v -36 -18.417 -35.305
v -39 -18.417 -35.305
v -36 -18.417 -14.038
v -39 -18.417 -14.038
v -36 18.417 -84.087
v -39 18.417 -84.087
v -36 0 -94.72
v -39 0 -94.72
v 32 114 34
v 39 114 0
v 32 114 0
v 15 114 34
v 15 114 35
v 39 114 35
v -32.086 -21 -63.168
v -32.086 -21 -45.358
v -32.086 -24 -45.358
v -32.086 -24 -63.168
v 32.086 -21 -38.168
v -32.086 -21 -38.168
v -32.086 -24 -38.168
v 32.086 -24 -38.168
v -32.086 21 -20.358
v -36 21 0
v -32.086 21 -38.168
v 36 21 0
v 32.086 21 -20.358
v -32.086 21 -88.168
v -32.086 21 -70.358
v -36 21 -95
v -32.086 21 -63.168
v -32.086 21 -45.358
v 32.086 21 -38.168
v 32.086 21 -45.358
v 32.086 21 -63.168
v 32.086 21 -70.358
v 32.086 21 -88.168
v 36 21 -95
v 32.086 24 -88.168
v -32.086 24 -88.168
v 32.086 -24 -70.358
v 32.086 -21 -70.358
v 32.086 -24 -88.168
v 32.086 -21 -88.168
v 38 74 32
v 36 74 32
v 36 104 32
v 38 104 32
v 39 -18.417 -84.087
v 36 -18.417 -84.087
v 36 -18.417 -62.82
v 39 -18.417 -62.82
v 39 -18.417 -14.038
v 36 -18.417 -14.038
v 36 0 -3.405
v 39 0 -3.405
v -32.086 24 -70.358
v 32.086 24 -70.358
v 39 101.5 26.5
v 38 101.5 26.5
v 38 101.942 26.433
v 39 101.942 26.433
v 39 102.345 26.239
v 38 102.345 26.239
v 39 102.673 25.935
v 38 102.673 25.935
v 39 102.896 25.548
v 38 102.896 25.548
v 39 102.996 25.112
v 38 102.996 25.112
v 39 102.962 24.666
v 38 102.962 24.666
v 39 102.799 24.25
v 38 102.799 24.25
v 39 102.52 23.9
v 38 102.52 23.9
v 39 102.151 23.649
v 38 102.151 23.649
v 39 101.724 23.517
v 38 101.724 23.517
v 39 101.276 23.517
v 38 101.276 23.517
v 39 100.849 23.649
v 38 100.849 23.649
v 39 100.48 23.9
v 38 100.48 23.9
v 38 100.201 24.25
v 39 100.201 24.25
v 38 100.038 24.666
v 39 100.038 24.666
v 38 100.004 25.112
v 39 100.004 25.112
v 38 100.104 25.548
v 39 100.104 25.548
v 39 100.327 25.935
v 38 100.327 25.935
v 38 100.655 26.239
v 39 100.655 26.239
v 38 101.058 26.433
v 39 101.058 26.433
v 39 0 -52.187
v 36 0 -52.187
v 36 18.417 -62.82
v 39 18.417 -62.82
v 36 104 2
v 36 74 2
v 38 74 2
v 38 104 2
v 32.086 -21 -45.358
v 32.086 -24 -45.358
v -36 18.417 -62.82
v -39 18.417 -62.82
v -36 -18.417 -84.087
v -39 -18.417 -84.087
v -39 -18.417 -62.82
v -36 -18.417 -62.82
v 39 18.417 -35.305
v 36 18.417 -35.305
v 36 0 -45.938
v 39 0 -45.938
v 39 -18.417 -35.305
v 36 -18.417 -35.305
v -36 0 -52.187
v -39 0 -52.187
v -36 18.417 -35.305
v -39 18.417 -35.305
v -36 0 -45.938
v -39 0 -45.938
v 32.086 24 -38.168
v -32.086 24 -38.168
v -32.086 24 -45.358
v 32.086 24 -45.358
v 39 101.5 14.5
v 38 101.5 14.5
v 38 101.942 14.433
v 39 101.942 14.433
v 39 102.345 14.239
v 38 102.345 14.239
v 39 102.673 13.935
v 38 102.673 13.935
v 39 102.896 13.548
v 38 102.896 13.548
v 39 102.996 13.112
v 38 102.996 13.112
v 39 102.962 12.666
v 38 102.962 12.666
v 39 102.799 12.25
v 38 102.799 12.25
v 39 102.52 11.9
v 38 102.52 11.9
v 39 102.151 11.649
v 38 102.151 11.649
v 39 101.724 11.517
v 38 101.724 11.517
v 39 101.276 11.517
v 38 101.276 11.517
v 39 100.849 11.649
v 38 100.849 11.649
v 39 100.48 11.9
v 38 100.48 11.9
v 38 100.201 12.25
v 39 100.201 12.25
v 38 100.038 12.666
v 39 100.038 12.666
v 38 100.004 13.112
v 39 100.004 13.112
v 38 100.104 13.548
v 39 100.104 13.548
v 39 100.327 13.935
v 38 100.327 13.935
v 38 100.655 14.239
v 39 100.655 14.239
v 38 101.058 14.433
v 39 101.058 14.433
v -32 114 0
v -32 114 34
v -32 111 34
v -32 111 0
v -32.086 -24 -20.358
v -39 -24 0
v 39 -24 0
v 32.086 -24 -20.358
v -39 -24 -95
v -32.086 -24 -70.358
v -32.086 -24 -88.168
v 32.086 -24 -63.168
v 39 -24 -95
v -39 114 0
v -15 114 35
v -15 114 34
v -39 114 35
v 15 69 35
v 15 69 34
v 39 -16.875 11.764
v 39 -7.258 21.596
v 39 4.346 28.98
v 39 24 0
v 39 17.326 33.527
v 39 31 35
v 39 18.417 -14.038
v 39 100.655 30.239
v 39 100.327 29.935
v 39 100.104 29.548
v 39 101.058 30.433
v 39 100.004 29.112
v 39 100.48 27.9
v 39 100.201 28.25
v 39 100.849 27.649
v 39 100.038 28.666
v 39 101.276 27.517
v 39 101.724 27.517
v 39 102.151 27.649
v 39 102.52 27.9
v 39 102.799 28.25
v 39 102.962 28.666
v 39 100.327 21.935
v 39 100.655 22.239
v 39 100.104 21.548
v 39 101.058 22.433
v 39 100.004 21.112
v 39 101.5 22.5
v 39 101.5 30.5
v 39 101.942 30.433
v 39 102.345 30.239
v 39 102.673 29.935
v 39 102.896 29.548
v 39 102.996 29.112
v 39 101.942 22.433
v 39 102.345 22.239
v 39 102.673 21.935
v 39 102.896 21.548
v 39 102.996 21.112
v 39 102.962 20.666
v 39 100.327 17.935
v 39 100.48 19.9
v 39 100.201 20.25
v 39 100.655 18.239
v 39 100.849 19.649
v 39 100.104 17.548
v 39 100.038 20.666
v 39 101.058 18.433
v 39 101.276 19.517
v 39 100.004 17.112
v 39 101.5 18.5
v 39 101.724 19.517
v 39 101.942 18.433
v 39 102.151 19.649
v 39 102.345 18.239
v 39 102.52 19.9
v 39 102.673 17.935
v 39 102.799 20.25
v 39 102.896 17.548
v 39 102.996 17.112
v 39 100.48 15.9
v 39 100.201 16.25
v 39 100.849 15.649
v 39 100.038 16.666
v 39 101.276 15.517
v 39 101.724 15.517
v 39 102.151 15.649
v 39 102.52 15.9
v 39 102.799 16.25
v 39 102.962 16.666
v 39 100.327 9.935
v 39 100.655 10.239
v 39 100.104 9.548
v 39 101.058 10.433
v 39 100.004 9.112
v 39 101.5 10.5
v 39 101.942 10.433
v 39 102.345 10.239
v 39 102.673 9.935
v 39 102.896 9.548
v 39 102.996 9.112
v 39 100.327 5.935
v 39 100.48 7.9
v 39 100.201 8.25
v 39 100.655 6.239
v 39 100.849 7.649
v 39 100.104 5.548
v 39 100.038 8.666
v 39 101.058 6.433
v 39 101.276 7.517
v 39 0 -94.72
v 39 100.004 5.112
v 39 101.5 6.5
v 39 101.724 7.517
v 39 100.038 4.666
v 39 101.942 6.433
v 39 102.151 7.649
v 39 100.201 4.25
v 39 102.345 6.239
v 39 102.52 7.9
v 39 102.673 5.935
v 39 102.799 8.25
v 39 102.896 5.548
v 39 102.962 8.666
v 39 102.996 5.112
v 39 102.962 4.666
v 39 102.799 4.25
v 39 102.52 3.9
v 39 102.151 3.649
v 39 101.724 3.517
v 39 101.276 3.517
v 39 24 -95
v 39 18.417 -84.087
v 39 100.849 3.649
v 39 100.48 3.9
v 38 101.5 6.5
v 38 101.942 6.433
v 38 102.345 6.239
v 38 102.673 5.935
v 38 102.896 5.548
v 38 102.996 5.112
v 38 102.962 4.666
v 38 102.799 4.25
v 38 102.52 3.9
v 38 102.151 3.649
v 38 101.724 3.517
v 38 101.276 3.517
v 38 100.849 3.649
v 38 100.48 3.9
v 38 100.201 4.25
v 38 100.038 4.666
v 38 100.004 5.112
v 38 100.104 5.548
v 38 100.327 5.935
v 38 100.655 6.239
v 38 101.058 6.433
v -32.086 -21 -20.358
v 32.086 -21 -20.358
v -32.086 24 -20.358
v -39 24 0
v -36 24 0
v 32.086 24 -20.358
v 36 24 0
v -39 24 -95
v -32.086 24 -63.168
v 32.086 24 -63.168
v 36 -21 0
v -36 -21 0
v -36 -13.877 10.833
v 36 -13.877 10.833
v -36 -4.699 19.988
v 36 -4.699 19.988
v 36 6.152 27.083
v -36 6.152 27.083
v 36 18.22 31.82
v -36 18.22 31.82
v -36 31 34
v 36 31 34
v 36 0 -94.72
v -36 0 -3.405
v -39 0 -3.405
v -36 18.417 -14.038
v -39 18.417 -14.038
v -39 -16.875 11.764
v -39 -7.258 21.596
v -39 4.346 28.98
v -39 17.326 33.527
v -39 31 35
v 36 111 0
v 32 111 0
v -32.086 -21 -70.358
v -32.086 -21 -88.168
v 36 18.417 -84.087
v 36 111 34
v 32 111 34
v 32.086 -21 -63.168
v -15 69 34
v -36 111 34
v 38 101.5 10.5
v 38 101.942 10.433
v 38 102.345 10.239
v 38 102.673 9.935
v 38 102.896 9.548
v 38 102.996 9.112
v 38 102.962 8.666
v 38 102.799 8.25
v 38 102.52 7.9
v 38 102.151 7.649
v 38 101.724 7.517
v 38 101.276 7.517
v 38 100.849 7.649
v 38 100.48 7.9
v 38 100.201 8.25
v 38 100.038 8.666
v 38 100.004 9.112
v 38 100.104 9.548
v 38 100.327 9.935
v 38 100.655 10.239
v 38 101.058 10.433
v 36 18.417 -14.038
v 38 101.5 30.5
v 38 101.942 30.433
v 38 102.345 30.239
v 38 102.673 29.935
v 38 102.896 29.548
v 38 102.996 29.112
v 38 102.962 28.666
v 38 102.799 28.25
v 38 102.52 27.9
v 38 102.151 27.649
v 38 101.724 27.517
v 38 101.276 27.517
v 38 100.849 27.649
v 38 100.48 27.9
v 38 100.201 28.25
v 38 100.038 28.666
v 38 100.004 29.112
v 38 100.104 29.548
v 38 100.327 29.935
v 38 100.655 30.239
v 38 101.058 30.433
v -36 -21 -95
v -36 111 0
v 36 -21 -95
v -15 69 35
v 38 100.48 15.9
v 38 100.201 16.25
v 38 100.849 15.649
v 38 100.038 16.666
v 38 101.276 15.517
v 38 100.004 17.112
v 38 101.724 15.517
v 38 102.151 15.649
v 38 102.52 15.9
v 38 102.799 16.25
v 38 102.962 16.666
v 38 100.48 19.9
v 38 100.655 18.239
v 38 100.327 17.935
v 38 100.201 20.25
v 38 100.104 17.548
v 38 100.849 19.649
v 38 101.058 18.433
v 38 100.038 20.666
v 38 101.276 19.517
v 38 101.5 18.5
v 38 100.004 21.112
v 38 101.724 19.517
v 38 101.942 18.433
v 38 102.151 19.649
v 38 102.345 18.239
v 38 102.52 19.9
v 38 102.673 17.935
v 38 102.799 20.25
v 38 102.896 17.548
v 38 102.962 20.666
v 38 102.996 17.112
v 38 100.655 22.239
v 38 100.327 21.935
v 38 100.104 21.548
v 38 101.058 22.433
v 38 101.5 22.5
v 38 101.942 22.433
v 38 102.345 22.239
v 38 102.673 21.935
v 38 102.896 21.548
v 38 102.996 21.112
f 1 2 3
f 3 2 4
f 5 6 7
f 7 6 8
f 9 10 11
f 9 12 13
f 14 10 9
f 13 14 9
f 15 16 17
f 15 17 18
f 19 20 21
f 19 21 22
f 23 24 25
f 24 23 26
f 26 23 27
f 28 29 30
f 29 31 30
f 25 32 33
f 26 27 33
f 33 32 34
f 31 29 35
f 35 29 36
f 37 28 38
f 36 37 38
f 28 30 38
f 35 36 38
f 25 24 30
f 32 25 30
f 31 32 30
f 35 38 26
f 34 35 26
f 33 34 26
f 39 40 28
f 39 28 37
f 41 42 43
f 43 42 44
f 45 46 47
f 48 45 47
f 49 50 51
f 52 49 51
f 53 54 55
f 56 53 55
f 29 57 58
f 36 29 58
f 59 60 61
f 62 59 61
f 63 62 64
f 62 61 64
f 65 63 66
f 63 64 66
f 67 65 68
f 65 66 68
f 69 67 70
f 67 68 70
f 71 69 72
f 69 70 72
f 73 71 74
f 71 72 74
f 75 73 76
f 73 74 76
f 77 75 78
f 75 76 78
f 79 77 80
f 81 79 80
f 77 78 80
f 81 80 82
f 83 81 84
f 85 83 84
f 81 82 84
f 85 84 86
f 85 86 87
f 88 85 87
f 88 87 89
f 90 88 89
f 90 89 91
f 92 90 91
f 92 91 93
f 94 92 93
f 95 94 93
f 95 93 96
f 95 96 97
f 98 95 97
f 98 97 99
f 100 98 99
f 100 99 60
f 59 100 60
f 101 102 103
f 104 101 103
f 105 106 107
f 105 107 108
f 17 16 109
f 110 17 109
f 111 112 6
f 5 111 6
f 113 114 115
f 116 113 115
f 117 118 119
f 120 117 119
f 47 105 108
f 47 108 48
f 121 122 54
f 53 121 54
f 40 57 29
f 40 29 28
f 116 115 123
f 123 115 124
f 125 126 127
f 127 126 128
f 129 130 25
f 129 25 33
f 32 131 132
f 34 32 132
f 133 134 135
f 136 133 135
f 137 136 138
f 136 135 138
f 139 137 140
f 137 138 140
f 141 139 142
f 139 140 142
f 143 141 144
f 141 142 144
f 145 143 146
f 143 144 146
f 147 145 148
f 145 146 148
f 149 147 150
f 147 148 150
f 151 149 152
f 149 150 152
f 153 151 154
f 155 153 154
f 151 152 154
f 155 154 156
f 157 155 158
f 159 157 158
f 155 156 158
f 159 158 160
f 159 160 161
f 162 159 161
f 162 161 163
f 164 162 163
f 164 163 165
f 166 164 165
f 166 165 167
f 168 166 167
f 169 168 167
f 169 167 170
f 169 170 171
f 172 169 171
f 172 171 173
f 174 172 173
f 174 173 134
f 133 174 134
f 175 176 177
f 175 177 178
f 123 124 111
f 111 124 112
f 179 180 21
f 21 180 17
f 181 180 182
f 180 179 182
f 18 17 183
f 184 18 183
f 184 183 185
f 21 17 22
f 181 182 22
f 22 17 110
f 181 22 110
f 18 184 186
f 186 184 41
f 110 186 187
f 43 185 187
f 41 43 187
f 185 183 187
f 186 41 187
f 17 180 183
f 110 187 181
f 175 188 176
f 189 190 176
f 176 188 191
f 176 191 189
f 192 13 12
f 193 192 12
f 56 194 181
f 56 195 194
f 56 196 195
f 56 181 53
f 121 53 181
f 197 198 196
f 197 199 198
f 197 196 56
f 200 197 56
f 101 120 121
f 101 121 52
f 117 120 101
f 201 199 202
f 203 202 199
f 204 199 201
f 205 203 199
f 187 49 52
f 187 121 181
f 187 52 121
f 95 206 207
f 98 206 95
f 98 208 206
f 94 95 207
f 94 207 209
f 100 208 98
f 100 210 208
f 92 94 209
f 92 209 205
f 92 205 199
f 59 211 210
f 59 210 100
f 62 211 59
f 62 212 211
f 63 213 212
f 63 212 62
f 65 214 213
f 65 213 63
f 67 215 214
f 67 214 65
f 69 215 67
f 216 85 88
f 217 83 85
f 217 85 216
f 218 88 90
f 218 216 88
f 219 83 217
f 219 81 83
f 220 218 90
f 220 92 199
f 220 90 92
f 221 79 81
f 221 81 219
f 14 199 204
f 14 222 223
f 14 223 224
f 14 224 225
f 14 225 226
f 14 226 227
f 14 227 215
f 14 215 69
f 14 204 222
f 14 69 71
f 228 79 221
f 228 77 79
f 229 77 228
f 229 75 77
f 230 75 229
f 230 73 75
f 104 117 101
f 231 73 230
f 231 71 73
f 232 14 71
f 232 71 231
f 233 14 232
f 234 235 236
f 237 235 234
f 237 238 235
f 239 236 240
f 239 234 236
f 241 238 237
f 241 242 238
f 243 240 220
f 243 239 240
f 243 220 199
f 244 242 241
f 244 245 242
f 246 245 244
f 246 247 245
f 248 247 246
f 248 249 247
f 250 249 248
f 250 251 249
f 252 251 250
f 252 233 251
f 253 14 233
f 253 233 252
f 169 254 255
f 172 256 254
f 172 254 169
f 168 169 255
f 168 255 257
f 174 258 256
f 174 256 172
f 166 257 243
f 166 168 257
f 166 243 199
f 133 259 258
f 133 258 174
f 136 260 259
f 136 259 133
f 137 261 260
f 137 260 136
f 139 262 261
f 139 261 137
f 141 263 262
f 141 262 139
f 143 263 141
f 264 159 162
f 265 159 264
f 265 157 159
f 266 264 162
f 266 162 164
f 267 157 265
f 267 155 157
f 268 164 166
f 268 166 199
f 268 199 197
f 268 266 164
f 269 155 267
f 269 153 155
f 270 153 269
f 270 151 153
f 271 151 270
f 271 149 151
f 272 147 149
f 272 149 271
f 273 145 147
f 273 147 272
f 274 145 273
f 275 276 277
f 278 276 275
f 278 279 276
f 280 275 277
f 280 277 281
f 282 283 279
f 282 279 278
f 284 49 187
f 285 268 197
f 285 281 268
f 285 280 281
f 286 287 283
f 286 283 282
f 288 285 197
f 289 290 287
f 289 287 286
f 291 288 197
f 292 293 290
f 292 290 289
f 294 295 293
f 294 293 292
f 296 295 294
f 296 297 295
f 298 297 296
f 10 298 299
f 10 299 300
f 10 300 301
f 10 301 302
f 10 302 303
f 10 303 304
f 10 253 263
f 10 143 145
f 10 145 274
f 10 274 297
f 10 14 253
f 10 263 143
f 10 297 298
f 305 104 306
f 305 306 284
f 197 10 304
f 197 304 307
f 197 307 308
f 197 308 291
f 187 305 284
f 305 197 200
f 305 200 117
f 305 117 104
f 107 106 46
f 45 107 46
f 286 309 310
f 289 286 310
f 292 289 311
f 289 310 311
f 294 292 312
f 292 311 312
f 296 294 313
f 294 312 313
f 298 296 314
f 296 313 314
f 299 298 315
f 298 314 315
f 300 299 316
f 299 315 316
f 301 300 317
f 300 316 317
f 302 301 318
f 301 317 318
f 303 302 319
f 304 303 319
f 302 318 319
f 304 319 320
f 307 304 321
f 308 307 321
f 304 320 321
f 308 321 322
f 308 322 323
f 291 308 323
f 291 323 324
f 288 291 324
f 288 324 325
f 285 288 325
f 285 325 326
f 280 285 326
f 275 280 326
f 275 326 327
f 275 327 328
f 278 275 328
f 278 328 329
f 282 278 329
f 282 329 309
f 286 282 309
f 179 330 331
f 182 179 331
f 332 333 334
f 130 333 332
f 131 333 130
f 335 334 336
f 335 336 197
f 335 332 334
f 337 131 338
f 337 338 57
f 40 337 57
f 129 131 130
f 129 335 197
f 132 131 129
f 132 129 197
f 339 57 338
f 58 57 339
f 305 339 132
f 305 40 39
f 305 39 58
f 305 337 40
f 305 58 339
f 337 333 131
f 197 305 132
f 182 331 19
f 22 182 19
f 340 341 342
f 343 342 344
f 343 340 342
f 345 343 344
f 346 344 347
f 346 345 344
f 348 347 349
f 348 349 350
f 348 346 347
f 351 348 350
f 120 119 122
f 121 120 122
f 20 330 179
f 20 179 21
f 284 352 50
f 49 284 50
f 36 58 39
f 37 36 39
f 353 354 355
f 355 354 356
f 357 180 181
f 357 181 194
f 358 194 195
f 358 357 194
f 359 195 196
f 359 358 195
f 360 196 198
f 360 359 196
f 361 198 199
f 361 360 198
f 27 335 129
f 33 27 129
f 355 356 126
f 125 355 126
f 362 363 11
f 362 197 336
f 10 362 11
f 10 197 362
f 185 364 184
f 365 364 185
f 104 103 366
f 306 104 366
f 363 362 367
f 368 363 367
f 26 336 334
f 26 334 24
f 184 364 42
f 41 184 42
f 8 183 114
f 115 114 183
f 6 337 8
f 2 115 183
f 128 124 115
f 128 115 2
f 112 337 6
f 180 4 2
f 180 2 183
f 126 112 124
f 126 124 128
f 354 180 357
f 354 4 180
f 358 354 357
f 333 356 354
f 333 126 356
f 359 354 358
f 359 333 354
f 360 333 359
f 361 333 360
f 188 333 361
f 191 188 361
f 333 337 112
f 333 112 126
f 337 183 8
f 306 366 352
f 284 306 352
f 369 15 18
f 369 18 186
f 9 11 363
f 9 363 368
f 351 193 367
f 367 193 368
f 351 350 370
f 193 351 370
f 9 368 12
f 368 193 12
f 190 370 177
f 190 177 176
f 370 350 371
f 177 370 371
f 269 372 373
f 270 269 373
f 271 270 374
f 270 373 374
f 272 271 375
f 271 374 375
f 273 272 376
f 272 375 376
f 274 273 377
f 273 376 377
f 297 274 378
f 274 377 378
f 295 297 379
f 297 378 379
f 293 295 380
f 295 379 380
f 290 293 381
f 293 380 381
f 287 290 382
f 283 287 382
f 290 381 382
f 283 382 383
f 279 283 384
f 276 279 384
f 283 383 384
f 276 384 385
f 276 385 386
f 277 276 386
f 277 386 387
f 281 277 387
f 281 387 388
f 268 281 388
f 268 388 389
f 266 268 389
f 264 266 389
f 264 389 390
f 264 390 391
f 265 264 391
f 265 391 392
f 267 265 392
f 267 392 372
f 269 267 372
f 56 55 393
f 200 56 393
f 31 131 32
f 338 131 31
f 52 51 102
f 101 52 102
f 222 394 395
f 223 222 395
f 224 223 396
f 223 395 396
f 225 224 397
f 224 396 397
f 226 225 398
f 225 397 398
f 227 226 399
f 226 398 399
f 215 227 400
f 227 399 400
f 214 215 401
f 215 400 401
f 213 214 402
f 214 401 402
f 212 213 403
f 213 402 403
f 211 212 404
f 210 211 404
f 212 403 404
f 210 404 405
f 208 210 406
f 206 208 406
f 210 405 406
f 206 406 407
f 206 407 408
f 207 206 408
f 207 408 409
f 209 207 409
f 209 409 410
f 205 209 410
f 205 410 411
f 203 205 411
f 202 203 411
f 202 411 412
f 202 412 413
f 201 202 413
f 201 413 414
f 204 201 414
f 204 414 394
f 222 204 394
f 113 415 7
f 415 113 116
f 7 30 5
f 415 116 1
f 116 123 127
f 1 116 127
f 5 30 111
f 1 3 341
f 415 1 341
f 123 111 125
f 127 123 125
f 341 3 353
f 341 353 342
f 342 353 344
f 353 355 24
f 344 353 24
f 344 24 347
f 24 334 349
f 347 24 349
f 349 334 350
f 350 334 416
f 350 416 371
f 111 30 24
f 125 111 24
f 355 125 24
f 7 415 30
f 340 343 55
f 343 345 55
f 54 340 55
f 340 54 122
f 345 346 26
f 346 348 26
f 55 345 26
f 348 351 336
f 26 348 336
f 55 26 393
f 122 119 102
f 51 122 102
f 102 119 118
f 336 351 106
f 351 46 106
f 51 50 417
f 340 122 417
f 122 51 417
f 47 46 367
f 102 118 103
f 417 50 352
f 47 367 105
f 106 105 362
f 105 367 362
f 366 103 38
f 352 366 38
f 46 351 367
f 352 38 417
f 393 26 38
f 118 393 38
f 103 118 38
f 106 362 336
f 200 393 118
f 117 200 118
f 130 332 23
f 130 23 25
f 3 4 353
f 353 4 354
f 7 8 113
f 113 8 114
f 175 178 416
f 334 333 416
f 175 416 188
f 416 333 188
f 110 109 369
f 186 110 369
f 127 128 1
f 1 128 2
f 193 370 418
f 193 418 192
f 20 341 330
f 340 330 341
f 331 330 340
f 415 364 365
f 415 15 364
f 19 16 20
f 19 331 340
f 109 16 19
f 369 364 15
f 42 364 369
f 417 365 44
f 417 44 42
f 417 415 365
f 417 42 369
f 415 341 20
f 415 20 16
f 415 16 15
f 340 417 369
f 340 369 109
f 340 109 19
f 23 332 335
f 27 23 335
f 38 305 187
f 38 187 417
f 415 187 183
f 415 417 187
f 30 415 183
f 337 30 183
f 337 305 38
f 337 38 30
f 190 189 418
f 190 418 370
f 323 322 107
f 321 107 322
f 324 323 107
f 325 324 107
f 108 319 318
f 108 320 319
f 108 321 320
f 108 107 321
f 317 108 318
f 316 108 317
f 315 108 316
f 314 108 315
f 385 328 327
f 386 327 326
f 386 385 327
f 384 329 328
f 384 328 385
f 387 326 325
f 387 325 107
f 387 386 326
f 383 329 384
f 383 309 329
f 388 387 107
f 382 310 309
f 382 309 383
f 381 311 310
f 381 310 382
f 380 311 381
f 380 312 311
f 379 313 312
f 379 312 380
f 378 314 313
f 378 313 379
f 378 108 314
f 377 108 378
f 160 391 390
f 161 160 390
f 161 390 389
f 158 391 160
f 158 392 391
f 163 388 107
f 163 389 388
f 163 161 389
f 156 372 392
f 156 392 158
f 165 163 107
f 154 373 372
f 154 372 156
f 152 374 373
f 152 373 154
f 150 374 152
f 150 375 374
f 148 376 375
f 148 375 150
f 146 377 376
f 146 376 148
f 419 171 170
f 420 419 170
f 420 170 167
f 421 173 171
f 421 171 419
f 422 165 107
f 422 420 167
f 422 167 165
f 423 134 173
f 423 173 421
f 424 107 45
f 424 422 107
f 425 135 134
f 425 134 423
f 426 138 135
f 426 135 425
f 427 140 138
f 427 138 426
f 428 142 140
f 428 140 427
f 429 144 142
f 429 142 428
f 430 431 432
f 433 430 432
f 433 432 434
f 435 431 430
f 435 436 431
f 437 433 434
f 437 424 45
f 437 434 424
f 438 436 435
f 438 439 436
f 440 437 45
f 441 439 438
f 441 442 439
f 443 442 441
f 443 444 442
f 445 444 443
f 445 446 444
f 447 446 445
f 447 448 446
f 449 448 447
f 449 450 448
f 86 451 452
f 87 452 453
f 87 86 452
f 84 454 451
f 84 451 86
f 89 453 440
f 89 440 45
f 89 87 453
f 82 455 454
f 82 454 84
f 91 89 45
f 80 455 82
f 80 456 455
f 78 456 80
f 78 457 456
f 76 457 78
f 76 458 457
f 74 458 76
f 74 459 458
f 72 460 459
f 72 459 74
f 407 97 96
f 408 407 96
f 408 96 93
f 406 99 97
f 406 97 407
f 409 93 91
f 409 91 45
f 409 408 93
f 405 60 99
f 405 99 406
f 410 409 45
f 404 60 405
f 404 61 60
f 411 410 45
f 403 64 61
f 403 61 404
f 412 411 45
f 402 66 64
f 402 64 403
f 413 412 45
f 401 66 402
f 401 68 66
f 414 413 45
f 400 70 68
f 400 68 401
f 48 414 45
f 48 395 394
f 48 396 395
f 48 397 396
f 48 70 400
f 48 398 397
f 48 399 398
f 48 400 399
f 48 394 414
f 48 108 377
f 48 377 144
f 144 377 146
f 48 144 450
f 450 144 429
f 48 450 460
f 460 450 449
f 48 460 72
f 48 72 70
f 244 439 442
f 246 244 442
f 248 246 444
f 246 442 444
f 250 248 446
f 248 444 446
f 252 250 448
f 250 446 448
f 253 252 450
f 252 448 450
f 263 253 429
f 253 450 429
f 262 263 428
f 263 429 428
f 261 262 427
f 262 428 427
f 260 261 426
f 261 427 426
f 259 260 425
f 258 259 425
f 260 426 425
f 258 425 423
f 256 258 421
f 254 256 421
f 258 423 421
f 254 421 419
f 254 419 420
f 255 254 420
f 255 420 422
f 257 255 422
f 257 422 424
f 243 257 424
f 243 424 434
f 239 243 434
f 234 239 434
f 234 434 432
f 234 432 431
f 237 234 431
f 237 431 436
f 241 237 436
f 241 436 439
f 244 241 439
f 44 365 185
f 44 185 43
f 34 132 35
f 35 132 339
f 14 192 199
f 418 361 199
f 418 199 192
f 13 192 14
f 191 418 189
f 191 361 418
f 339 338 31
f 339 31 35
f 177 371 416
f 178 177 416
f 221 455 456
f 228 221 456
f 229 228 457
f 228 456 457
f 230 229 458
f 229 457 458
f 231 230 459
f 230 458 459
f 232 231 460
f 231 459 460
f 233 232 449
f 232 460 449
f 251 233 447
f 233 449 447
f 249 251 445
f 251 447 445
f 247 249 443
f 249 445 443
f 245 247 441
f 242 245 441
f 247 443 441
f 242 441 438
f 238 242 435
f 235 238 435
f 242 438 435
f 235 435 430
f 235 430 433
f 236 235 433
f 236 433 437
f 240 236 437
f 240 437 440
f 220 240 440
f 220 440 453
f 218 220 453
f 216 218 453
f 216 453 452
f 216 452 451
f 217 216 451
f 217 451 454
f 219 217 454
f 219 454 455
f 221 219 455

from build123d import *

# Parameters (mm, degrees)
BOUNDARY2_START       = -200
BOUNDARY2_OUTLINE_W   = 78
BOUNDARY2_OUTLINE_H   = 48
BOUNDARY2_OUTLINE_W_2 = 72
BOUNDARY2_OUTLINE_H_2 = 42
BOUNDARY2_DEPTH       = 200
BOSS_EXTRUDE1_DEPTH   = 78
CUT_EXTRUDE7_DEPTH    = 72
SKETCH9_W             = 1
SKETCH9_H             = 83
BOSS_EXTRUDE2_DEPTH   = 78
SKETCH10_W            = 34
SKETCH10_H            = 83
BOSS_EXTRUDE3_DEPTH   = 3
SKETCH11_W            = 34
SKETCH11_H            = 83
BOSS_EXTRUDE4_DEPTH   = 3
SKETCH12_W            = 30
SKETCH12_H            = 30
CUT_EXTRUDE8_DEPTH    = 2
SKETCH13_R            = 1.5
CUT_EXTRUDE9_DEPTH    = 2
SKETCH14_W            = 30
SKETCH14_H            = 29.06458826
CUT_EXTRUDE10_DEPTH   = 45
CUT_EXTRUDE14_DEPTH   = 102
SKETCH19_W            = 64.171404934
SKETCH19_H            = 17.809337631
CUT_EXTRUDE15_DEPTH   = 102
SKETCH22_W            = 34
SKETCH22_H            = 3
BOSS_EXTRUDE5_DEPTH   = 4
SKETCH23_W            = 34
SKETCH23_H            = 3
BOSS_EXTRUDE6_DEPTH   = 4
IZIM1_W               = 78
IZIM1_H               = 48
IZIM1_W_2             = 72
IZIM1_H_2             = 42
KES_EKSTR_ZYON2_DEPTH = 105


# Read off the part's stored shape, not the designer's step: Boundary2
with BuildPart() as part:
    # Boundary2 outline → Boundary2 (new body)
    with BuildSketch(Plane.XY.offset(BOUNDARY2_START)):
        Rectangle(BOUNDARY2_OUTLINE_W, BOUNDARY2_OUTLINE_H)
        Rectangle(BOUNDARY2_OUTLINE_W_2, BOUNDARY2_OUTLINE_H_2, mode=Mode.SUBTRACT)
    extrude(amount=BOUNDARY2_DEPTH)

    # Sketch4 → Boss-Extrude1 (add)
    with BuildSketch(Plane.ZY.offset(39)):
        with BuildLine():
            Line((35, 31), (0, 31))
            Line((0, 31), (0, -24))
            ThreePointArc((0, -24), (25.621419403, -1.668175984), (35, 31))
        make_face()
    extrude(amount=-BOSS_EXTRUDE1_DEPTH)

    # Sketch7 → Cut-Extrude7 (cut)
    with BuildSketch(Plane(origin=(36, 0, 0), x_dir=(0, 0, -1), z_dir=(1, 0, 0))):
        with BuildLine():
            Line((-34, 31), (0, 31))
            Line((0, 31), (0, -21))
            ThreePointArc((0, -21), (-23.813697573, 0.544890049), (-34, 31))
        make_face()
    extrude(amount=-CUT_EXTRUDE7_DEPTH, mode=Mode.SUBTRACT)

    # Sketch9 → Boss-Extrude2 (add)
    with BuildSketch(Plane.ZY.offset(39)):
        with Locations((34.5, 72.5)):
            Rectangle(SKETCH9_W, SKETCH9_H)
    extrude(amount=-BOSS_EXTRUDE2_DEPTH)

    # Sketch10 → Boss-Extrude3 (add)
    with BuildSketch(Plane(origin=(39, 0, 0), x_dir=(0, 0, -1), z_dir=(1, 0, 0))):
        with Locations((-17, 72.5)):
            Rectangle(SKETCH10_W, SKETCH10_H)
    extrude(amount=-BOSS_EXTRUDE3_DEPTH)

    # Sketch11 → Boss-Extrude4 (add)
    with BuildSketch(Plane.ZY.offset(39)):
        with Locations((17, 72.5)):
            Rectangle(SKETCH11_W, SKETCH11_H)
    extrude(amount=-BOSS_EXTRUDE4_DEPTH)

    # Sketch12 → Cut-Extrude8 (cut)
    with BuildSketch(Plane.ZY.offset(-36)):
        with Locations((17, 89)):
            Rectangle(SKETCH12_W, SKETCH12_H)
    extrude(amount=-CUT_EXTRUDE8_DEPTH, mode=Mode.SUBTRACT)

    # Sketch13 → Cut-Extrude9 (cut)
    with BuildSketch(Plane.ZY.offset(-38)):
        with Locations((5, 101.5)):
            Circle(SKETCH13_R)
        with Locations((9, 101.5)):
            Circle(SKETCH13_R)
        with Locations((13, 101.5)):
            Circle(SKETCH13_R)
        with Locations((17, 101.5)):
            Circle(SKETCH13_R)
        with Locations((21, 101.5)):
            Circle(SKETCH13_R)
        with Locations((25, 101.5)):
            Circle(SKETCH13_R)
        with Locations((29, 101.5)):
            Circle(SKETCH13_R)
    extrude(amount=-CUT_EXTRUDE9_DEPTH, mode=Mode.SUBTRACT)

    # Sketch14 → Cut-Extrude10 (cut)
    with BuildSketch(Plane(origin=(0, 114, 0), x_dir=(1, 0, 0), z_dir=(0, 1, 0))):
        with Locations((0, -34)):
            Rectangle(SKETCH14_W, SKETCH14_H)
    extrude(amount=-CUT_EXTRUDE10_DEPTH, mode=Mode.SUBTRACT)

    # Sketch17 → Cut-Extrude14 (cut)
    with BuildSketch(Plane.ZY.offset(39)):
        Polygon((-100.968873407, 0), (-111.602076583, 18.417248148), (-132.868482935, 18.417248148), (-143.501686111, 0), (-132.868482935, -18.417248148), (-111.602076583, -18.417248148), align=None)
        Polygon((-149.750833218, 0), (-160.384036394, 18.417248148), (-181.650442746, 18.417248148), (-192.283645923, 0), (-181.650442746, -18.417248148), (-160.384036394, -18.417248148), align=None)
        Polygon((-52.186913596, 0), (-62.820116772, 18.417248148), (-84.086523124, 18.417248148), (-94.7197263, 0), (-84.086523124, -18.417248148), (-62.820116772, -18.417248148), align=None)
        Polygon((-3.404953785, 0), (-14.038156961, 18.417248148), (-35.304563313, 18.417248148), (-45.937766489, 0), (-35.304563313, -18.417248148), (-14.038156961, -18.417248148), align=None)
    extrude(amount=-CUT_EXTRUDE14_DEPTH, mode=Mode.SUBTRACT)

    # Sketch19 → Cut-Extrude15 (cut)
    with BuildSketch(Plane(origin=(0, 24, 0), x_dir=(1, 0, 0), z_dir=(0, 1, 0))):
        with Locations((0, 154.262884124)):
            Rectangle(SKETCH19_W, SKETCH19_H)
        with Locations((0, 179.262884124)):
            Rectangle(SKETCH19_W, SKETCH19_H)
        with Locations((0, 129.262884124)):
            Rectangle(SKETCH19_W, SKETCH19_H)
        with Locations((0, 104.262884124)):
            Rectangle(SKETCH19_W, SKETCH19_H)
        with Locations((0, 79.262884124)):
            Rectangle(SKETCH19_W, SKETCH19_H)
        with Locations((0, 54.262884124)):
            Rectangle(SKETCH19_W, SKETCH19_H)
        with Locations((0, 29.262884124)):
            Rectangle(SKETCH19_W, SKETCH19_H)
    extrude(amount=-CUT_EXTRUDE15_DEPTH, mode=Mode.SUBTRACT)

    # Sketch22 → Boss-Extrude5 (add)
    with BuildSketch(Plane(origin=(-36, 0, 0), x_dir=(0, 0, -1), z_dir=(1, 0, 0))):
        with Locations((-17, 112.5)):
            Rectangle(SKETCH22_W, SKETCH22_H)
    extrude(amount=BOSS_EXTRUDE5_DEPTH)

    # Sketch23 → Boss-Extrude6 (add)
    with BuildSketch(Plane.ZY.offset(-36)):
        with Locations((17, 112.5)):
            Rectangle(SKETCH23_W, SKETCH23_H)
    extrude(amount=BOSS_EXTRUDE6_DEPTH)

    # Çizim1 → Kes-Ekstrüzyon2 (cut)
    with BuildSketch(Plane(origin=(0, 0, -200), x_dir=(-1, 0, 0), z_dir=(0, 0, -1))):
        Rectangle(IZIM1_W, IZIM1_H)
        Rectangle(IZIM1_W_2, IZIM1_H_2, mode=Mode.SUBTRACT)
    extrude(amount=-KES_EKSTR_ZYON2_DEPTH, mode=Mode.SUBTRACT)


solid = part.part
